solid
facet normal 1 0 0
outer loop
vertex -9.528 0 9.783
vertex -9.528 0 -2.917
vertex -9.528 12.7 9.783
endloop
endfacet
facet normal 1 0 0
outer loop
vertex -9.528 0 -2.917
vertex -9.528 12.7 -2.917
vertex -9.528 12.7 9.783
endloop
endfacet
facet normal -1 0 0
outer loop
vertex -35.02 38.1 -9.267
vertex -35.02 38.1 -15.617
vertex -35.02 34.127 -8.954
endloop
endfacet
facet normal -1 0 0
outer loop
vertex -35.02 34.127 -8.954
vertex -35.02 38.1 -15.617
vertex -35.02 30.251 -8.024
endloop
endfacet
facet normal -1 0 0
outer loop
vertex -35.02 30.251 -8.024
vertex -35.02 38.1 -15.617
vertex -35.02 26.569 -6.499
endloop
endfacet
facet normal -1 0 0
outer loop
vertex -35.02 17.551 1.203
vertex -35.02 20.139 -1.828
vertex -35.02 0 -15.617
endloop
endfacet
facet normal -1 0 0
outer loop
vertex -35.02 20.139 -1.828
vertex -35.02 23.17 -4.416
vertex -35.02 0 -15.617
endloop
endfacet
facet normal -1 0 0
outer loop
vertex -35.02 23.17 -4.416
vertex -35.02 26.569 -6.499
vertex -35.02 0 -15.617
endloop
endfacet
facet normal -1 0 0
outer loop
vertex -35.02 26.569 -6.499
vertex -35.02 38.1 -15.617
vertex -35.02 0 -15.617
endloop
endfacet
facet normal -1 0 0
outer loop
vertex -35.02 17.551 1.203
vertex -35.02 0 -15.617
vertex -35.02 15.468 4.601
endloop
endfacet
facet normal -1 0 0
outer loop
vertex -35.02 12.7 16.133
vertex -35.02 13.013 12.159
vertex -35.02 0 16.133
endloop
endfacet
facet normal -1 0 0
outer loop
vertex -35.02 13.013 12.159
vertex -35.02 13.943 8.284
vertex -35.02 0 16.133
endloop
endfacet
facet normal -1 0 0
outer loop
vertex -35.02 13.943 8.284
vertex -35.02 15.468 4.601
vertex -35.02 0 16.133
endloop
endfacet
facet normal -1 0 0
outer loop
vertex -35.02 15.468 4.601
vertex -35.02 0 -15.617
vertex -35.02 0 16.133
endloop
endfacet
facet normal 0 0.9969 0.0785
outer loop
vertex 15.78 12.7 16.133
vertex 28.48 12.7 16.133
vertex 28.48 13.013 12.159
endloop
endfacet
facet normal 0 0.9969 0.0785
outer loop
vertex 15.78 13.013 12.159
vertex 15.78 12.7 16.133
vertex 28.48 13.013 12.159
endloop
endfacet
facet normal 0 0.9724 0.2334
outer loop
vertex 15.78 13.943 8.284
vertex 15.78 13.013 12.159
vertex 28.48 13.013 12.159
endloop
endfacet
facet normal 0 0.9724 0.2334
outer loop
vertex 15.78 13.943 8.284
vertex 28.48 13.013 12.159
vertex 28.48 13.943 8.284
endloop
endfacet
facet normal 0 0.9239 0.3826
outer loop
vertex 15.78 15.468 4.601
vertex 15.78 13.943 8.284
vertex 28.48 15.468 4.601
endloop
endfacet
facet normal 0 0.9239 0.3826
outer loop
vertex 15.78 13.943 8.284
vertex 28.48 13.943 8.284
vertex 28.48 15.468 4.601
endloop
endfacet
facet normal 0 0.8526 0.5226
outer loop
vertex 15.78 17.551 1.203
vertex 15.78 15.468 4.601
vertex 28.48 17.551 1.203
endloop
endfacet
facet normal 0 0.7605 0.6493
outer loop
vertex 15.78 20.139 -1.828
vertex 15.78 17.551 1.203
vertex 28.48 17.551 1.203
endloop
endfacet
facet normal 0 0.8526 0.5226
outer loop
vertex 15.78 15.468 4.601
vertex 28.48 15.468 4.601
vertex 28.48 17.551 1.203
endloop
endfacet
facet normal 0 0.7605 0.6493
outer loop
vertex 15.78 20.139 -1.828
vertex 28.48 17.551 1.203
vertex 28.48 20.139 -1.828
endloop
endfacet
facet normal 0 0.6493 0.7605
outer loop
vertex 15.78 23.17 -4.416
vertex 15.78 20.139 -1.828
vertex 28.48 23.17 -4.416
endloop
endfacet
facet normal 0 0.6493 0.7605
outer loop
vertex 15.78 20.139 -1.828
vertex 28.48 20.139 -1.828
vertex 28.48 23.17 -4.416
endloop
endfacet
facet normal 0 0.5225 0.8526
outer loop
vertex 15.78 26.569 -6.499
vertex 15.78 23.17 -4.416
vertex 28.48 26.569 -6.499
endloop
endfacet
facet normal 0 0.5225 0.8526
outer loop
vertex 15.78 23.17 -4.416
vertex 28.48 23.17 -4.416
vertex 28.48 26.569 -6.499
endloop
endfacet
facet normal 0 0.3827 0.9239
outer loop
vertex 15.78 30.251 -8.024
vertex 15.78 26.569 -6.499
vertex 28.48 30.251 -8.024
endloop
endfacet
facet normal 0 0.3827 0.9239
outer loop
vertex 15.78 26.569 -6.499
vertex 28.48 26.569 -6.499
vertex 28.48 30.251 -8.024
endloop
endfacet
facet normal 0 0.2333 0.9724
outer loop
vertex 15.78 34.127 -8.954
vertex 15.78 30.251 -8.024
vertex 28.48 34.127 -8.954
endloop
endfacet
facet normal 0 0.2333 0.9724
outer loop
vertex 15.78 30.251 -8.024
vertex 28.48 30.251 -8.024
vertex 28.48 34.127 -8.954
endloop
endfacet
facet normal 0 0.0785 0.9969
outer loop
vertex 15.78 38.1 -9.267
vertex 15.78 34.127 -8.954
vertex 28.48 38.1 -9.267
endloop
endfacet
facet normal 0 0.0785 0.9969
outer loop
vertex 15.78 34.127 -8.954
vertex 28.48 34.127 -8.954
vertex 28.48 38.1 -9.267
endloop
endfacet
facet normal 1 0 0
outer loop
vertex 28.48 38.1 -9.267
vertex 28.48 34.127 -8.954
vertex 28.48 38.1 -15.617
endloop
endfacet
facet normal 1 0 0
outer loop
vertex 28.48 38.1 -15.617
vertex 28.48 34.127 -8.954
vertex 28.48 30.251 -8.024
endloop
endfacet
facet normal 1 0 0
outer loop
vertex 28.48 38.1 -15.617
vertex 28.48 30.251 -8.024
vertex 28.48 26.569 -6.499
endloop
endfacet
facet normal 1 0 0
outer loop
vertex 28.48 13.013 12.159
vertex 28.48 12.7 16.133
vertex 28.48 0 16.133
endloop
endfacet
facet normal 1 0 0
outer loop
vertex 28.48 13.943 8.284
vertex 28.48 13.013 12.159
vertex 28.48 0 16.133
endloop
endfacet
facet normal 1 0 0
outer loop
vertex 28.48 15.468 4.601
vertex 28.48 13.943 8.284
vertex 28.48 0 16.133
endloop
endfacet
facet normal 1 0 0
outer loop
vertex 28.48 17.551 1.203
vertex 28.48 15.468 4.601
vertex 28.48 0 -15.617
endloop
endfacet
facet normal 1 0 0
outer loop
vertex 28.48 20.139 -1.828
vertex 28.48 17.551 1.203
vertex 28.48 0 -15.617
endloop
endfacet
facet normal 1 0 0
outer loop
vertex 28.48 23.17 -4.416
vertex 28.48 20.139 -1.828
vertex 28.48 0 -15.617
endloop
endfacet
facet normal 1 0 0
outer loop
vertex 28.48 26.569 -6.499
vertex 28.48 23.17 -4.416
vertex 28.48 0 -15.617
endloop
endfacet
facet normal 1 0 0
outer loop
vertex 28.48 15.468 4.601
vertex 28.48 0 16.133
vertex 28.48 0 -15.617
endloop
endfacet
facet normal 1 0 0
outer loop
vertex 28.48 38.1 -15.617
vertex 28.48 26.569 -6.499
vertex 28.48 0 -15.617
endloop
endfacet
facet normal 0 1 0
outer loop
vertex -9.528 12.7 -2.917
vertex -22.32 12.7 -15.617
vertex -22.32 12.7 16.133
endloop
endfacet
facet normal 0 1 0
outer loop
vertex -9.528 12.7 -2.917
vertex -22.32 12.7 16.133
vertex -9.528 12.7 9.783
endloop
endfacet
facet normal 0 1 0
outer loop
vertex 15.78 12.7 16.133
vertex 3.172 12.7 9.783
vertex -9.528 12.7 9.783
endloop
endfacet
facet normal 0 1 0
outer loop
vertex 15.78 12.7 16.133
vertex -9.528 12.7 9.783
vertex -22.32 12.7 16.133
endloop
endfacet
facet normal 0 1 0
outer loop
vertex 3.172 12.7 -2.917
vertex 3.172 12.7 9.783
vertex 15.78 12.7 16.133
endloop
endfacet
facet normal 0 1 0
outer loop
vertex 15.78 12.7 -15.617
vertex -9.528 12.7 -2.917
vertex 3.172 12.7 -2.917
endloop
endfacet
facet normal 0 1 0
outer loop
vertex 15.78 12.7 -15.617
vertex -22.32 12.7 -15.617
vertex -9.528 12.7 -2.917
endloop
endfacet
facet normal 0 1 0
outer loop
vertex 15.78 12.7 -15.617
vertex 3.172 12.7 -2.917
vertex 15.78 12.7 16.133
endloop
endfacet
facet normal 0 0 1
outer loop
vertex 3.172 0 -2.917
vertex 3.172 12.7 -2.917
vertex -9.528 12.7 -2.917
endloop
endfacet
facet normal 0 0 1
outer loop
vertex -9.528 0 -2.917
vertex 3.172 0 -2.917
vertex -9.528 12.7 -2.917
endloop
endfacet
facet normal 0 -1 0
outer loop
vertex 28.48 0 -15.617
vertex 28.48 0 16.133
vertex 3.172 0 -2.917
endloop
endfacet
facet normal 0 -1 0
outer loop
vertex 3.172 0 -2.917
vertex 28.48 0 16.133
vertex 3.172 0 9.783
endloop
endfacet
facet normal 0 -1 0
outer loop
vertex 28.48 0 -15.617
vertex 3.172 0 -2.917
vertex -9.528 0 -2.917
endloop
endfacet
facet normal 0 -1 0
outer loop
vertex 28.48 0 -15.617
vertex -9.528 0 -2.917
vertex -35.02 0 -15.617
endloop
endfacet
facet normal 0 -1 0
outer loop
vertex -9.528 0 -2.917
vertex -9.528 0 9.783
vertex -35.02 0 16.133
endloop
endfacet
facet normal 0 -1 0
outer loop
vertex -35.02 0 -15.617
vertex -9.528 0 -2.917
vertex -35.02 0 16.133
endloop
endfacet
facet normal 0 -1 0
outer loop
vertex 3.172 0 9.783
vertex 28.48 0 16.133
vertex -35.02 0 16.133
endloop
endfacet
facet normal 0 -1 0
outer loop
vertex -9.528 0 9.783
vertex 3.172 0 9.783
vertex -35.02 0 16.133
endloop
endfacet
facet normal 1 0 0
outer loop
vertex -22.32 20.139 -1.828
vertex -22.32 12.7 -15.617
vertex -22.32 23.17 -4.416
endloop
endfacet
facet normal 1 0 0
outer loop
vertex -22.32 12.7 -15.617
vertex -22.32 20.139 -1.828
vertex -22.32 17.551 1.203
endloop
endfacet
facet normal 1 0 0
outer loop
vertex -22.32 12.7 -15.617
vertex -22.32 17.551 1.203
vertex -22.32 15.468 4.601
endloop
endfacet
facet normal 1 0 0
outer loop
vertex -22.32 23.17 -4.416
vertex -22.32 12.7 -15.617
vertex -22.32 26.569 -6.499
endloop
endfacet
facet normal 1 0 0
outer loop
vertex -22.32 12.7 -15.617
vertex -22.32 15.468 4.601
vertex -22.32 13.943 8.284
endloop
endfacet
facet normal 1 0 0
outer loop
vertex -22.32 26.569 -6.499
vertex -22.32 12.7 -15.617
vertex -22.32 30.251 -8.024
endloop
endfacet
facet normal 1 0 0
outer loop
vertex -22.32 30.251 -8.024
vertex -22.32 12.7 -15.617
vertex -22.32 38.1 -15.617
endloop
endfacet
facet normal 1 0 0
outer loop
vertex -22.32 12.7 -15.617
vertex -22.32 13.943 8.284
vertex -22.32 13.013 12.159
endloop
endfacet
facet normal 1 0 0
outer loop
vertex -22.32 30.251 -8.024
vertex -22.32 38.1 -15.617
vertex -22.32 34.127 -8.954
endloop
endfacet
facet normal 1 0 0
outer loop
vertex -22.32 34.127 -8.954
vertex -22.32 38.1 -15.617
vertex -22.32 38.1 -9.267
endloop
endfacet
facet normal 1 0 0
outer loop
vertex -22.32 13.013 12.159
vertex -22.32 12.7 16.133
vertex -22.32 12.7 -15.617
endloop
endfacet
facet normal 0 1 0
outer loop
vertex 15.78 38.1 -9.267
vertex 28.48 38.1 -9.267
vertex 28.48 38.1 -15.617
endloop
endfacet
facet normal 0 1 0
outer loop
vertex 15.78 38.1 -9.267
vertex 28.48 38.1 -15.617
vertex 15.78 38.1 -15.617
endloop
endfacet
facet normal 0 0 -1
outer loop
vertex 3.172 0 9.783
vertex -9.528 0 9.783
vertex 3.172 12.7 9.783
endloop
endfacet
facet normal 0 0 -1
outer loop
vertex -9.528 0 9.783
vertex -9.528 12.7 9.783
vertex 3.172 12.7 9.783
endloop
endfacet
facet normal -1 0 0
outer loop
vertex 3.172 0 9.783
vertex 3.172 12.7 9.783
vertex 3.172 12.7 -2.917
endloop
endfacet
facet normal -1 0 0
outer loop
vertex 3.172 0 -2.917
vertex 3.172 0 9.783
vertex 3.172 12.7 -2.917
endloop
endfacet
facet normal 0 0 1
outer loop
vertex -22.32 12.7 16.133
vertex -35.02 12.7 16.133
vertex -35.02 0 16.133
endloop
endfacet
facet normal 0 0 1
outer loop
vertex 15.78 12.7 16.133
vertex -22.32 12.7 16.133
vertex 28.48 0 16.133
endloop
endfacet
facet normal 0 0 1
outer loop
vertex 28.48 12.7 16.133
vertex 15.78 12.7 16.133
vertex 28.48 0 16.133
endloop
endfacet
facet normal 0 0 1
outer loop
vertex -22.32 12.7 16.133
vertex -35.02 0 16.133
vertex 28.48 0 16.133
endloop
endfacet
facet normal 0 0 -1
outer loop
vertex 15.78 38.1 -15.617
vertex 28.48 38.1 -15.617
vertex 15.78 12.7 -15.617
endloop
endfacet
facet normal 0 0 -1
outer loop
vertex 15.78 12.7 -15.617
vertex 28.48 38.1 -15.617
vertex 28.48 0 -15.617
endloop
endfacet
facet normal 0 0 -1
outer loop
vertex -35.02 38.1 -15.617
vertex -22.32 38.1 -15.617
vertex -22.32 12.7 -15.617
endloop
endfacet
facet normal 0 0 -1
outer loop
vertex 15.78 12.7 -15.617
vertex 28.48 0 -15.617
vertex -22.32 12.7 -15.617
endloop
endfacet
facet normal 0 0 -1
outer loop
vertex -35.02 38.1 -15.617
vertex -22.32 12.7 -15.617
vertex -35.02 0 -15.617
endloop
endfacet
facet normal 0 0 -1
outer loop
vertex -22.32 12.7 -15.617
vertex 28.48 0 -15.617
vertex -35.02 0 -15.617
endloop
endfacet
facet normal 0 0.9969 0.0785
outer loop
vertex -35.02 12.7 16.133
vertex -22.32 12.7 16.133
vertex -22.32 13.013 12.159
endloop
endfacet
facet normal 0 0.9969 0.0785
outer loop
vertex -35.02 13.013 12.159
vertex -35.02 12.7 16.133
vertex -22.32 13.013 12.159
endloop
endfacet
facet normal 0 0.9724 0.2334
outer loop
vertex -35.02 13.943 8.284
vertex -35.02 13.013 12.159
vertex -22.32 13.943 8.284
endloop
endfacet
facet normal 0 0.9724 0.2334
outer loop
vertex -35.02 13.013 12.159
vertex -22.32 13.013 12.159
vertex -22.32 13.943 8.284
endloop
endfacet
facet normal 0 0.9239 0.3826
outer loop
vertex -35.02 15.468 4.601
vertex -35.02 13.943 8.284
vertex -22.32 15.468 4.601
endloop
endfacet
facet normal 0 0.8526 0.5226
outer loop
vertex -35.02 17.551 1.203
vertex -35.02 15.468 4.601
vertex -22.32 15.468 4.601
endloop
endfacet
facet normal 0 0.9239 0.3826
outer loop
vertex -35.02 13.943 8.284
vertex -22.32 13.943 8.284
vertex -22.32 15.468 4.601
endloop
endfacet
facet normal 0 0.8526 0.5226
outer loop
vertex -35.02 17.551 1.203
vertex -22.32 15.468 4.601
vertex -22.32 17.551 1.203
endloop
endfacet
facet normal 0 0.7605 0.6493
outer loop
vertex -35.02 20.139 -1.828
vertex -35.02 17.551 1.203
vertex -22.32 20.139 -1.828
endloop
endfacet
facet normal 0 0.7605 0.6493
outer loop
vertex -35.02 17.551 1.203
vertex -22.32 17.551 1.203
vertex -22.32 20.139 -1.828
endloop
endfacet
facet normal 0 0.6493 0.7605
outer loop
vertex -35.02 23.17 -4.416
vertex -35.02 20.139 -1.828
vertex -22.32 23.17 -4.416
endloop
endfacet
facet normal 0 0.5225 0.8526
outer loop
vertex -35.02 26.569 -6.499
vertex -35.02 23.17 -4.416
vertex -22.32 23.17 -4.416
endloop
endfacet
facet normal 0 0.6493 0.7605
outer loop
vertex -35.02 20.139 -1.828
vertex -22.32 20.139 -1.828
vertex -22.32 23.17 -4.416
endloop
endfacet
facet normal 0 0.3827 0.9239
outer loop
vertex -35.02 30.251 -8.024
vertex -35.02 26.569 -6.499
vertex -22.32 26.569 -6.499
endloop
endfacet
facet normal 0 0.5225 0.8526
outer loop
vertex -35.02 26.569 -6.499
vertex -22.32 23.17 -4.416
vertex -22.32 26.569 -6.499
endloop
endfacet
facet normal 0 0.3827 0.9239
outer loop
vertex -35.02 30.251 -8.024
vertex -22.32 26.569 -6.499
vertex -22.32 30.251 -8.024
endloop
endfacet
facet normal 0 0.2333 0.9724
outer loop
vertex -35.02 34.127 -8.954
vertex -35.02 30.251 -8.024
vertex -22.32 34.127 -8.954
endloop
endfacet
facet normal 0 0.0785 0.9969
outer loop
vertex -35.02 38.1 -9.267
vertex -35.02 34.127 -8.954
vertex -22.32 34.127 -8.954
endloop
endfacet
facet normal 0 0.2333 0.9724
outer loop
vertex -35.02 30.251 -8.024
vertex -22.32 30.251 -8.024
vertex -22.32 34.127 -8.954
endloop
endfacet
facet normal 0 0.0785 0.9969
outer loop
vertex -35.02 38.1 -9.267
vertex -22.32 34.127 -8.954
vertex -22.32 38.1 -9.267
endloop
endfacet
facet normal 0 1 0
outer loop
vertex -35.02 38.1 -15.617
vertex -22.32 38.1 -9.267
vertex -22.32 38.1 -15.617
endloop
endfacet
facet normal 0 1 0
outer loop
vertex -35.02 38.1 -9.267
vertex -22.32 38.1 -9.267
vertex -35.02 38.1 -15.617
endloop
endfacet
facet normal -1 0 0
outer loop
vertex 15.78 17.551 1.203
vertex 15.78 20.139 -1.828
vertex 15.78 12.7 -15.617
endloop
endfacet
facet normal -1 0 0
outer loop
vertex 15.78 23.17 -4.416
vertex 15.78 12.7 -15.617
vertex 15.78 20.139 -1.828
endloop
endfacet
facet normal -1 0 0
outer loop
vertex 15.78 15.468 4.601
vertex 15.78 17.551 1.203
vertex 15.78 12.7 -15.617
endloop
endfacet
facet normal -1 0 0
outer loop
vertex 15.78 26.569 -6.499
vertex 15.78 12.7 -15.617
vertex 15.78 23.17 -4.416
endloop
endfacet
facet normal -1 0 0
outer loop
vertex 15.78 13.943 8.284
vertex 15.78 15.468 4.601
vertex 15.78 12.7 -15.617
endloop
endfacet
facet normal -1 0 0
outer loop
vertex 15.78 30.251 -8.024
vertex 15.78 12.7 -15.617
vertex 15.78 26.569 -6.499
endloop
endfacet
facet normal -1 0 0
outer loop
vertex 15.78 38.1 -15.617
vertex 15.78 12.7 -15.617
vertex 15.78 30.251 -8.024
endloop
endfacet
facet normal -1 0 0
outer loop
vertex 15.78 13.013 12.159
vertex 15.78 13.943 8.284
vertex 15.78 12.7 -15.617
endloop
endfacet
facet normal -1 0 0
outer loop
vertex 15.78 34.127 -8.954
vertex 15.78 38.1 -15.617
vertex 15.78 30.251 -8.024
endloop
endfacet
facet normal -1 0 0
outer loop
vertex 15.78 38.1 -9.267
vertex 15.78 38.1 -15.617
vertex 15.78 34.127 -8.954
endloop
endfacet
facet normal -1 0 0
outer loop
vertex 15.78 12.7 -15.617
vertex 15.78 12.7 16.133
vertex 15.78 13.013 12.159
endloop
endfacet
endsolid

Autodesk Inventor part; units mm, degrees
ref_plane "YZ Plane" through (0, 0, 0) normal (1, 0, 0) x (0, 1, 0)
ref_plane "XZ Plane" through (0, 0, 0) normal (0, 1, 0) x (-1, 0, 0)
ref_plane "XY Plane" through (0, 0, 0) normal (0, 0, 1) x (1, 0, 0)
sketch "Sketch1" plane through (0, 0, 0) normal (0, 1, 0) x (-1, 0, 0)
  line L0 (35.0198, 16.1328) -> (-28.4802, 16.1328)
  line L1 (-28.4802, 16.1328) -> (-28.4802, -15.6172)
  line L2 (-28.4802, -15.6172) -> (35.0198, -15.6172)
  line L3 (35.0198, -15.6172) -> (35.0198, 16.1328)
  point P0 (0, 0)
  dimension "d0" = 63.5
  dimension "d1" = 31.75
extrude "Extrusion1" add sketch "Sketch1" along normal blind 38.1
sketch "Sketch2" plane through (0, 38.1, 0) normal (0, 1, 0) x (1, 0, 0)
  line L0 (28.4802, -16.1328) -> (28.4802, 15.6172) projected
  line L1 (15.7802, 15.6172) -> (15.7802, 9.2672)
  line L2 (28.4802, 9.2672) -> (28.4802, 15.6172)
  line L3 (15.7802, 15.6172) -> (-22.3198, 15.6172)
  line L4 (-22.3198, 15.6172) -> (-22.3198, -16.1328)
  line L5 (-22.3198, -16.1328) -> (15.7802, -16.1328)
  line L6 (15.7802, -16.1328) -> (15.7802, 15.6172)
  point P0 (0, 0)
  dimension "d4" = 12.7
  dimension "d5" = 6.35
  dimension "d6" = 38.1
  dimension "d7" = 31.75
extrude "Extrusion2" cut sketch "Sketch2" against normal blind 25.4
sketch "Sketch3" plane through (28.4802, 0, 16.1328) normal (1, 0, 0) x (0, 0, -1)
  line L0 (0, 12.7) -> (0, 38.1) projected
  circle A0 centre (0, 38.1) radius 25.4
  point P0 (16.1328, 0)
  dimension "d10" = 50.8
extrude "Extrusion3" cut sketch "Sketch3" against normal blind 76.2
sketch "Sketch4" plane through (0, 12.7, 0) normal (0, 1, 0) x (1, 0, 0)
  line L0 (28.4802, 15.6172) -> (-35.0198, 15.6172) projected
  line L1 (15.8725, 15.6172) -> (3.1725, 15.6172)
  line L2 (15.8725, 2.9172) -> (15.8725, 15.6172)
  line L3 (3.1725, 2.9172) -> (-9.5275, 2.9172)
  line L4 (-9.5275, 2.9172) -> (-9.5275, -9.7828)
  line L5 (-9.5275, -9.7828) -> (3.1725, -9.7828)
  line L6 (3.1725, -9.7828) -> (3.1725, 2.9172)
  point P0 (0, 0)
  dimension "d13" = 12.7
  dimension "d14" = 12.7
  dimension "d15" = 12.7
  dimension "d16" = 12.7
extrude "Extrusion4" cut sketch "Sketch4" against normal blind 25.4
